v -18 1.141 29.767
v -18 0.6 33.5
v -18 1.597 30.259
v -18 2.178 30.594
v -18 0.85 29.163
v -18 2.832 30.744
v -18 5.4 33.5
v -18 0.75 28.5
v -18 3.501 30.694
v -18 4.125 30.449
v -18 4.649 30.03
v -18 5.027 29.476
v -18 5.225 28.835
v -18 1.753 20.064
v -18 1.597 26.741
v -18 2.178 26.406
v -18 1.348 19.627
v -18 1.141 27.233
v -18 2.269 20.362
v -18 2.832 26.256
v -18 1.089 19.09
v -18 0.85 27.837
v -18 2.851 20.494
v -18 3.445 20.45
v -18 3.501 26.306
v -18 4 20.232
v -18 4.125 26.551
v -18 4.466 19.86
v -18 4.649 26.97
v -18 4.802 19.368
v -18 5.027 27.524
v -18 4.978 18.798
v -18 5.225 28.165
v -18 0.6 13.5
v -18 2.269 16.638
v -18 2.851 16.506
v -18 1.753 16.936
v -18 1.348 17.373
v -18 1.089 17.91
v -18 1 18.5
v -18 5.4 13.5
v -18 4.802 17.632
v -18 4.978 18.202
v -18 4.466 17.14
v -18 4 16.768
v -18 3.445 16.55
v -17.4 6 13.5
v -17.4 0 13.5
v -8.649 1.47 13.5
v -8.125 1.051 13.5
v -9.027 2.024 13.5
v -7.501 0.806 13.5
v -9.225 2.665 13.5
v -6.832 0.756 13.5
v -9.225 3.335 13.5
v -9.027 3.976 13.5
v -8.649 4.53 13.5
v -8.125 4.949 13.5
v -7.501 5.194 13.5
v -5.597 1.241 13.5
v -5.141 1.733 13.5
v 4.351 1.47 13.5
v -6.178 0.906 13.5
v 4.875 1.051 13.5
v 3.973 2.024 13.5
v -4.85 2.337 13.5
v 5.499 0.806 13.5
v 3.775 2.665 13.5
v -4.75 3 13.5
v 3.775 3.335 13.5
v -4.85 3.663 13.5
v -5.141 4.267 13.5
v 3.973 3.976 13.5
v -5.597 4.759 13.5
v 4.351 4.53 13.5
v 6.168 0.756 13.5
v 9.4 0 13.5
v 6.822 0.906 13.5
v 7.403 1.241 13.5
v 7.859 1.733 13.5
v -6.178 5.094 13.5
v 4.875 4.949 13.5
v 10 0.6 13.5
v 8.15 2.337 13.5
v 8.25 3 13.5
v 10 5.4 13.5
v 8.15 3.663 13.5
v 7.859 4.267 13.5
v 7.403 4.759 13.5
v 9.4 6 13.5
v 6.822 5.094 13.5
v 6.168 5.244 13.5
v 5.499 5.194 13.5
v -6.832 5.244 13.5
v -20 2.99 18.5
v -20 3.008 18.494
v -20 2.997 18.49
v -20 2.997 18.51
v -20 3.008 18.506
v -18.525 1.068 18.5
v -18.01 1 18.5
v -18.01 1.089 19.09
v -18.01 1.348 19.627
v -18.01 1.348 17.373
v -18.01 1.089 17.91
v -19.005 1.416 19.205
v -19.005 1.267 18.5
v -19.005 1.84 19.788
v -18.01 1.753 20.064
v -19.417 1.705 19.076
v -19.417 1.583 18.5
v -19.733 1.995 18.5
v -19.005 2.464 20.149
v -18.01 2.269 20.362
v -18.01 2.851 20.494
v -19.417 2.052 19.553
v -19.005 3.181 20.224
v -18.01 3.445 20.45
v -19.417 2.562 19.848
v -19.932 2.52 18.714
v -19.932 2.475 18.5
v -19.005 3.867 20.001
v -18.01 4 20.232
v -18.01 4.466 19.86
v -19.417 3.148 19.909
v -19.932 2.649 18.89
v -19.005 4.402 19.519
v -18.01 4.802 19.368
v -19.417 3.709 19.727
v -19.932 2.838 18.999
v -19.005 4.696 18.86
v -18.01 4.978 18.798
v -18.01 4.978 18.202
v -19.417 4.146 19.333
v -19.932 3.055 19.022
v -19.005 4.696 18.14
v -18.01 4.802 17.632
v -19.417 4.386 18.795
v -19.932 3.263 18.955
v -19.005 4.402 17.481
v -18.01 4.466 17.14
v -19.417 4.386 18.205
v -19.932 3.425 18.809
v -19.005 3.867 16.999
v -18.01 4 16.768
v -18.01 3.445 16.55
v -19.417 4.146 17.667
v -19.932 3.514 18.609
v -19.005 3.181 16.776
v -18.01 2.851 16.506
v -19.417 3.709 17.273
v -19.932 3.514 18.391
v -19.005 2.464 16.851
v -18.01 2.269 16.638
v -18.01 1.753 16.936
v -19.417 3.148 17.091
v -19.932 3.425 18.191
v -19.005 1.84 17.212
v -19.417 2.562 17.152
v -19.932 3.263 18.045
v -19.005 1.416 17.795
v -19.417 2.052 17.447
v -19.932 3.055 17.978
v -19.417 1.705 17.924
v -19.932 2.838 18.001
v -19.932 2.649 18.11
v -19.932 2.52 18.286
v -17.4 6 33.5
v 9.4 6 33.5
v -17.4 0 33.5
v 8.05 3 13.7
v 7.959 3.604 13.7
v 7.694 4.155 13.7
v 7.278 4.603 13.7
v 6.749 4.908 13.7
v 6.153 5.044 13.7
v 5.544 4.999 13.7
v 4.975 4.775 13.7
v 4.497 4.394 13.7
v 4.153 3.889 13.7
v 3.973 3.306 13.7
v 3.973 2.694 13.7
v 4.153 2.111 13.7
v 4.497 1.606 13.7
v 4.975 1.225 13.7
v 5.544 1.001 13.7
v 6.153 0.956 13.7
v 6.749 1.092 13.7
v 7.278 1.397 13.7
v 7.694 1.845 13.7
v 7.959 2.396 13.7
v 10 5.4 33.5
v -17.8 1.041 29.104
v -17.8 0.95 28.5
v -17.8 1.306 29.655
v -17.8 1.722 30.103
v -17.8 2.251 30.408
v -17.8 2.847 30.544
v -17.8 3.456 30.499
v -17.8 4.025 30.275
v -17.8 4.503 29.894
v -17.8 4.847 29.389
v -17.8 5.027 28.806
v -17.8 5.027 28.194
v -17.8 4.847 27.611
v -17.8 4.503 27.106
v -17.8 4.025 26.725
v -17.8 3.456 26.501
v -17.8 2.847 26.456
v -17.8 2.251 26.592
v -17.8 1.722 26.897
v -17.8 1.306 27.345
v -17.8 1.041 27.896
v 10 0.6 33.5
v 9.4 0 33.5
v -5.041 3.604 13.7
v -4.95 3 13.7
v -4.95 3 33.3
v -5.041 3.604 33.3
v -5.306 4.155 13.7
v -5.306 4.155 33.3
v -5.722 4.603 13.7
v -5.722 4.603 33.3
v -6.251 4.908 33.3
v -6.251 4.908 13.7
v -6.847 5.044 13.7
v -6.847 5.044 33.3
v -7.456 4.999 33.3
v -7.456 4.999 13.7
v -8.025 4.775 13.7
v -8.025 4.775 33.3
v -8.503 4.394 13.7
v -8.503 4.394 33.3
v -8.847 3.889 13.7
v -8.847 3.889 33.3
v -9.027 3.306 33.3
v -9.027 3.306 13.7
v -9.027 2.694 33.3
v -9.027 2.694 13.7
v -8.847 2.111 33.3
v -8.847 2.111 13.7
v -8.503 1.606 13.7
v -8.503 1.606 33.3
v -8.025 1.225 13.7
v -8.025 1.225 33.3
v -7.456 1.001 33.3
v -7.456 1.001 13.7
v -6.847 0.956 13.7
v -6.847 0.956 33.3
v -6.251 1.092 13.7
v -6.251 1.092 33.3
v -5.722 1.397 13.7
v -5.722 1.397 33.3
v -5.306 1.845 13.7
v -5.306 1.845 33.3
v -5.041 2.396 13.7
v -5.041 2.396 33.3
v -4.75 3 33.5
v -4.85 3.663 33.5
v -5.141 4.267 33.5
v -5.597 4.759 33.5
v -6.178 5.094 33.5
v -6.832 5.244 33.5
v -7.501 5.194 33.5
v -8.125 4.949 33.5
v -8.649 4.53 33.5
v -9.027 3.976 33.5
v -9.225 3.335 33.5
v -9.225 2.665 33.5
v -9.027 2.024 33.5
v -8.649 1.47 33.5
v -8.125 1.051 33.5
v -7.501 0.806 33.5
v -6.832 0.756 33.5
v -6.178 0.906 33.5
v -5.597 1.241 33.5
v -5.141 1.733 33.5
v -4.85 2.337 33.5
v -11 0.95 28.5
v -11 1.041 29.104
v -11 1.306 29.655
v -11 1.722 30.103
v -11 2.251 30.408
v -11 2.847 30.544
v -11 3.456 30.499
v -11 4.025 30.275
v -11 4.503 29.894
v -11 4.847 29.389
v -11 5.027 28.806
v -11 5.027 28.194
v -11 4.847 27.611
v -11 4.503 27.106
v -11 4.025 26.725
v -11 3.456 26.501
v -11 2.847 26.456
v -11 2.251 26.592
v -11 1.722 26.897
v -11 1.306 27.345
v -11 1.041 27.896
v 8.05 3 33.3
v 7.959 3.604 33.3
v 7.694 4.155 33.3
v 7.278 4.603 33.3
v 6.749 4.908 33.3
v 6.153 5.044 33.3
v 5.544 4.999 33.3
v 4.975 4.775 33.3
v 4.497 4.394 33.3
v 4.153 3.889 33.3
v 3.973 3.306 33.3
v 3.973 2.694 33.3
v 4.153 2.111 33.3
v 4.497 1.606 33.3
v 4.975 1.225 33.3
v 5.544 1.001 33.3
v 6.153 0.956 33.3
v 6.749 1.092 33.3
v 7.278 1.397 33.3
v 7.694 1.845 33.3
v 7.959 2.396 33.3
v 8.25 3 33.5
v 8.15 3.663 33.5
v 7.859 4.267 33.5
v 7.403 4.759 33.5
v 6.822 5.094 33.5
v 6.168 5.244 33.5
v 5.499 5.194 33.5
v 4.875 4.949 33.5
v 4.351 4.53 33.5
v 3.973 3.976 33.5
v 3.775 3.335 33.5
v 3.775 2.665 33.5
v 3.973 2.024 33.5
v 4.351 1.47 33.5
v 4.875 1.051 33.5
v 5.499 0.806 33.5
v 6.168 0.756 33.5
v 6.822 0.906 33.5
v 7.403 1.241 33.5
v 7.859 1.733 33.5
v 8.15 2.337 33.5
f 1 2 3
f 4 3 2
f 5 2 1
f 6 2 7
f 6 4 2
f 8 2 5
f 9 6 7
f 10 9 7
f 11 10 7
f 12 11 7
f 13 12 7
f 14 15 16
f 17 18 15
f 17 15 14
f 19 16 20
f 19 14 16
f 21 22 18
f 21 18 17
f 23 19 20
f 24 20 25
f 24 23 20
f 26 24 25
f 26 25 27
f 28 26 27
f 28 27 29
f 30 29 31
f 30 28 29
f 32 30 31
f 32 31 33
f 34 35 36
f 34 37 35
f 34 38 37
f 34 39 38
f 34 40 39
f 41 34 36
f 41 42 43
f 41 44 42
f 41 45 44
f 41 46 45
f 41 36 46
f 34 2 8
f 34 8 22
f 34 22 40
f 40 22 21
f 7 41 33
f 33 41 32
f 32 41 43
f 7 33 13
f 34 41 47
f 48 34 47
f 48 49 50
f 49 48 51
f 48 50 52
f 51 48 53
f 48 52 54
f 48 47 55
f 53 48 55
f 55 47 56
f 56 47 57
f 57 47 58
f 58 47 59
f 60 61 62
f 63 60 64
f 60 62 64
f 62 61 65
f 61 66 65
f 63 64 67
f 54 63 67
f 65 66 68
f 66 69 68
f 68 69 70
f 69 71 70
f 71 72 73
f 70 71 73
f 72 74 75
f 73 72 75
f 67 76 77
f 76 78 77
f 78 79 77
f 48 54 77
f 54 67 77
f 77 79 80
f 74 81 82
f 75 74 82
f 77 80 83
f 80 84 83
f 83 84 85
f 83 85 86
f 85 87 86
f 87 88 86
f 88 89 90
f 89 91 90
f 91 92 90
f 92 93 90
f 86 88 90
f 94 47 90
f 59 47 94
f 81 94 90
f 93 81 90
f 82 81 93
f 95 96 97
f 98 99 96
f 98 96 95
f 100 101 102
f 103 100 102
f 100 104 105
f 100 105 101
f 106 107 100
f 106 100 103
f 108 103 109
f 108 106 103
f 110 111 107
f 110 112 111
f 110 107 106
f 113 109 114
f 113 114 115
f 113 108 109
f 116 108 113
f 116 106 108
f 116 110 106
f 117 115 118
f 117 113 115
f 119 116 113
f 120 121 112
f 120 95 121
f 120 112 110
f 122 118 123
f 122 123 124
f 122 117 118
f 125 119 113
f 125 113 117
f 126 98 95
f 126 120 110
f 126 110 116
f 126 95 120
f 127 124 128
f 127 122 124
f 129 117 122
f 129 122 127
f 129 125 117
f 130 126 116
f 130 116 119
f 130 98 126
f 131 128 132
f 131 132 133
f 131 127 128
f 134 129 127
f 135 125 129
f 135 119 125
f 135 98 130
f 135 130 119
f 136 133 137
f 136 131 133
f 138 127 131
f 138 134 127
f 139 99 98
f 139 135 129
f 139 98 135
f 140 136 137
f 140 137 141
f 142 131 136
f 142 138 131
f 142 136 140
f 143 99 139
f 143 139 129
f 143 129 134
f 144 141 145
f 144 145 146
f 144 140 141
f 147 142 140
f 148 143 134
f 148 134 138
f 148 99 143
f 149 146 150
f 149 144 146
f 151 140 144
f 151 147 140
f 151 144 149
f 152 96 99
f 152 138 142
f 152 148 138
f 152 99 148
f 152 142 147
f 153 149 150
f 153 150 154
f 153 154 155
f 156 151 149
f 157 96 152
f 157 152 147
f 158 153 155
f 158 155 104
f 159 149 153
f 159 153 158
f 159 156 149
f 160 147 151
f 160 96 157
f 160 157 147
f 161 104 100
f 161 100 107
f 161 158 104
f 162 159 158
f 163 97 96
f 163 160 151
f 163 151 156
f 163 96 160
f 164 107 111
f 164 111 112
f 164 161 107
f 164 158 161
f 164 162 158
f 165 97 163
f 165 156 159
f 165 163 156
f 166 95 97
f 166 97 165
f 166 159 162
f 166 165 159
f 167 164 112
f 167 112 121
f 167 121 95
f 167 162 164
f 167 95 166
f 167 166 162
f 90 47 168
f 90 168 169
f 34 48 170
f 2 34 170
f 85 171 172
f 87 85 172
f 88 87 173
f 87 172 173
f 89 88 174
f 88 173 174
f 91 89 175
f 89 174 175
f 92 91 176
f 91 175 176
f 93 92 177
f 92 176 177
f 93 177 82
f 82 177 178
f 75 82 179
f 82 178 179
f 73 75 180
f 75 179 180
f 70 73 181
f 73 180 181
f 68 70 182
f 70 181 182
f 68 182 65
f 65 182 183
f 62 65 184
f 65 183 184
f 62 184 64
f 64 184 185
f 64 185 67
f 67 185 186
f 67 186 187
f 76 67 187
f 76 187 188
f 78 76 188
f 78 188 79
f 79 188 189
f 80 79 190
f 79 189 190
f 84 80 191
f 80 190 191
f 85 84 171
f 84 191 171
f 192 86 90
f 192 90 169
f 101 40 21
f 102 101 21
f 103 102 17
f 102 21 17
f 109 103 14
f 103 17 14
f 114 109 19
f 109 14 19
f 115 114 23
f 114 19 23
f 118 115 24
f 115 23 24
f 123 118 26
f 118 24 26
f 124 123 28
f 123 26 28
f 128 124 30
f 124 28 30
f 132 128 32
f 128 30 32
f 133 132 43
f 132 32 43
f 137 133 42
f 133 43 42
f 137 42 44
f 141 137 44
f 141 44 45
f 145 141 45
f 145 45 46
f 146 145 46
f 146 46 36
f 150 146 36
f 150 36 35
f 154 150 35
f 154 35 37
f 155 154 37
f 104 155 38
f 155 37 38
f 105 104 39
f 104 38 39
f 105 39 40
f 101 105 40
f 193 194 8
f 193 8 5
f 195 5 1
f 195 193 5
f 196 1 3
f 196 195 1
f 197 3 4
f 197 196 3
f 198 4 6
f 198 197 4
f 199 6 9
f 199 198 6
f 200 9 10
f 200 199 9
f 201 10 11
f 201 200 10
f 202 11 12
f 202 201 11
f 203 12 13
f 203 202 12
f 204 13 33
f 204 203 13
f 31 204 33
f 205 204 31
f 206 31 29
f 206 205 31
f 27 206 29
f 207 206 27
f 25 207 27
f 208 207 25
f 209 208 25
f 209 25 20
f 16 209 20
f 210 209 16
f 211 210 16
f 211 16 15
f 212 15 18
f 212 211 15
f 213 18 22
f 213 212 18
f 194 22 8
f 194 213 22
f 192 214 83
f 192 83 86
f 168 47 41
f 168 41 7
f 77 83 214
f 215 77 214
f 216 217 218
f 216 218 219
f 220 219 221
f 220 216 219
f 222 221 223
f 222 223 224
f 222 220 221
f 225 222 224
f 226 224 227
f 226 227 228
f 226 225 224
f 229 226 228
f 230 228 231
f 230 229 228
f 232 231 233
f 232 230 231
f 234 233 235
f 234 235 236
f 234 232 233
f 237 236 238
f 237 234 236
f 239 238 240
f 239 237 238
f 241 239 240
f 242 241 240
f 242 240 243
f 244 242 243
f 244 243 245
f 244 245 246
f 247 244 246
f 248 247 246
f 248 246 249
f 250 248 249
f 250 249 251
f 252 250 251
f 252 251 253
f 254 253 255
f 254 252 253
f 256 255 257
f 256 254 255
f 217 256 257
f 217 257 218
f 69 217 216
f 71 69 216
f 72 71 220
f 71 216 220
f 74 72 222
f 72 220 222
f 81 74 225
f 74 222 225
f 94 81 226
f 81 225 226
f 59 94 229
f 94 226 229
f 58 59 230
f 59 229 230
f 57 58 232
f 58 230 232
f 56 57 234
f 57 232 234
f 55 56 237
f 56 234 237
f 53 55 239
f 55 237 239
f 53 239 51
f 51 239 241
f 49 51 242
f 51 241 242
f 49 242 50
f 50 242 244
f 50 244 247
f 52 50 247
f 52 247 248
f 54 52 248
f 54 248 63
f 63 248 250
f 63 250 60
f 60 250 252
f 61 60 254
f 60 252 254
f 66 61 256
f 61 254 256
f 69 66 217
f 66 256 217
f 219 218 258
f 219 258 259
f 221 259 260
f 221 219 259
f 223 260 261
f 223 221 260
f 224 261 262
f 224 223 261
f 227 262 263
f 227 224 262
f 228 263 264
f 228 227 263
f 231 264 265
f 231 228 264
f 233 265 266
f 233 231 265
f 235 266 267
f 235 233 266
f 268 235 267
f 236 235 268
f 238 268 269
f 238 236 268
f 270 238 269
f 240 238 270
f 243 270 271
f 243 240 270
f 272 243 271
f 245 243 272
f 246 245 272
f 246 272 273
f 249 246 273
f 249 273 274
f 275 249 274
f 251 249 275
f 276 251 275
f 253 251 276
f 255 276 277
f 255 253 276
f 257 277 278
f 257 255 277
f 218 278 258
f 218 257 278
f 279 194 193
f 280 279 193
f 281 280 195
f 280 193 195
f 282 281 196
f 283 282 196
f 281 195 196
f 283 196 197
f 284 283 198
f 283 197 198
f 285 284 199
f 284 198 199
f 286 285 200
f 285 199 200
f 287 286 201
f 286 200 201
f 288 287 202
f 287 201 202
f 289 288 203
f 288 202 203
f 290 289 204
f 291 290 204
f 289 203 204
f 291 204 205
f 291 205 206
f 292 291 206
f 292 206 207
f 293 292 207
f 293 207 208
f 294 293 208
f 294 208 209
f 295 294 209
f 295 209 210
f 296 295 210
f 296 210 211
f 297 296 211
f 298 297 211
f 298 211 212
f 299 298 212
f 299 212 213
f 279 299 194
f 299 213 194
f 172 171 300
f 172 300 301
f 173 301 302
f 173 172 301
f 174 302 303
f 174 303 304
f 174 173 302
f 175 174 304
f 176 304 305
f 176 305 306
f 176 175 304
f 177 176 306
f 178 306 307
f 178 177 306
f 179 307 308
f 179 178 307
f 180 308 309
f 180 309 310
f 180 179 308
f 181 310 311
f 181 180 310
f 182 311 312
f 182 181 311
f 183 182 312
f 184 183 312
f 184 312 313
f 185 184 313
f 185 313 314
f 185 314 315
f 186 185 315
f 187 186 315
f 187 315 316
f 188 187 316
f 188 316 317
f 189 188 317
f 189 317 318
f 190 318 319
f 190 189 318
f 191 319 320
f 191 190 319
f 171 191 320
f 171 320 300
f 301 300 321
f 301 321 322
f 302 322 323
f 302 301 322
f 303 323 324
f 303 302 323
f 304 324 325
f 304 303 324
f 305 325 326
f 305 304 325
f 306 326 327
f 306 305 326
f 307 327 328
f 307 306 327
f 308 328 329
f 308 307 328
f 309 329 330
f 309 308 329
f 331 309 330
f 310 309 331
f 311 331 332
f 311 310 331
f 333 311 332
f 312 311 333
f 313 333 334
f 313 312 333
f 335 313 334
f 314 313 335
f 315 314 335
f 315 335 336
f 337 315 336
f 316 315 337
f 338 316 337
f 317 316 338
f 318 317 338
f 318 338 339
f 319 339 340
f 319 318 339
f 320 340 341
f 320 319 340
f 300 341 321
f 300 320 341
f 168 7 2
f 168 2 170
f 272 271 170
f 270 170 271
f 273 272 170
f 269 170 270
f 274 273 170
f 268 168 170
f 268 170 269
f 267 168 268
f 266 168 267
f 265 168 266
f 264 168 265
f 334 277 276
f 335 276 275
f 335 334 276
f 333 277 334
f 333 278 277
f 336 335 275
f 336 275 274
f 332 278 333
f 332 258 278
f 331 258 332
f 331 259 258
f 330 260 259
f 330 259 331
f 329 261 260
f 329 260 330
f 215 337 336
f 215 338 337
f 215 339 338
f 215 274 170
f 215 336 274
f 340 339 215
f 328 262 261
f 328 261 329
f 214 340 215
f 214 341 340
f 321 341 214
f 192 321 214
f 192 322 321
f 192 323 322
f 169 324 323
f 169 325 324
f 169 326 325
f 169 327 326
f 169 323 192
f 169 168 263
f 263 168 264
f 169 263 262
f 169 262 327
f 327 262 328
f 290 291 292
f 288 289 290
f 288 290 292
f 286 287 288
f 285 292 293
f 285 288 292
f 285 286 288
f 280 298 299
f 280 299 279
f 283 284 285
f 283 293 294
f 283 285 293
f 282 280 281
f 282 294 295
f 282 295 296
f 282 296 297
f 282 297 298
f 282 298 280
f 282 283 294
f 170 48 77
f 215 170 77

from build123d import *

# Parameters (mm, degrees)
SKETCH082_W     = 28
SKETCH082_H     = 6
SKETCH082_R     = 2.05
PAD047_DEPTH    = 20
SKETCH083_R     = 2.05
POCKET032_DEPTH = 7
SKETCH084_R     = 2
PAD048_DEPTH    = 2
FILLET022_R     = 1.99
CHAMFER027_SIZE = 0.6
CHAMFER028_SIZE = 0.2


with BuildPart() as part:
    # Sketch082 → Pad047 (new body)
    with BuildSketch(Plane.XY):
        with Locations((-4, 3)):
            Rectangle(SKETCH082_W, SKETCH082_H)
        with Locations((-7, 3)):
            Circle(SKETCH082_R, mode=Mode.SUBTRACT)
        with Locations((6, 3)):
            Circle(SKETCH082_R, mode=Mode.SUBTRACT)
    extrude(amount=PAD047_DEPTH)

    # Sketch083 (on Face2 of Pad047) → Pocket032 (cut)
    with BuildSketch(Plane(origin=(-18, 0, 0), x_dir=(0, -1, 0), z_dir=(-1, 0, 0))):
        with Locations((-3, 15)):
            Circle(SKETCH083_R)
    extrude(amount=-POCKET032_DEPTH, mode=Mode.SUBTRACT)

    # Sketch084 (on Face3 of Pocket032) → Pad048 (join)
    with BuildSketch(Plane(origin=(-18, 0, 0), x_dir=(0, -1, 0), z_dir=(-1, 0, 0))):
        with Locations((-3, 5)):
            Circle(SKETCH084_R)
    extrude(amount=PAD048_DEPTH)

    # Fillet022
    fillet022_edges = [part.edges().sort_by_distance(p)[0] for p in [
        (-20, 5, 5),
    ]]
    fillet(fillet022_edges, radius=FILLET022_R)

    # Chamfer027
    chamfer027_edges = [part.edges().sort_by_distance(p)[0] for p in [
        (10, 0, 10),
        (10, 6, 10),
        (-18, 0, 10),
        (-18, 6, 10),
    ]]
    chamfer(chamfer027_edges, length=CHAMFER027_SIZE)

    # Chamfer028
    chamfer028_edges = [part.edges().sort_by_distance(p)[0] for p in [
        (-9.05, 3, 20),
        (3.95, 3, 20),
        (-9.05, 3, 0),
        (3.95, 3, 0),
        (-18, 5.05, 15),
    ]]
    chamfer(chamfer028_edges, length=CHAMFER028_SIZE)


with BuildPart() as part_1:
    # Body039 placement: moved
    add(part.part.moved(Location((-2e-06, 0, 13.5))))


solid = part_1.part
